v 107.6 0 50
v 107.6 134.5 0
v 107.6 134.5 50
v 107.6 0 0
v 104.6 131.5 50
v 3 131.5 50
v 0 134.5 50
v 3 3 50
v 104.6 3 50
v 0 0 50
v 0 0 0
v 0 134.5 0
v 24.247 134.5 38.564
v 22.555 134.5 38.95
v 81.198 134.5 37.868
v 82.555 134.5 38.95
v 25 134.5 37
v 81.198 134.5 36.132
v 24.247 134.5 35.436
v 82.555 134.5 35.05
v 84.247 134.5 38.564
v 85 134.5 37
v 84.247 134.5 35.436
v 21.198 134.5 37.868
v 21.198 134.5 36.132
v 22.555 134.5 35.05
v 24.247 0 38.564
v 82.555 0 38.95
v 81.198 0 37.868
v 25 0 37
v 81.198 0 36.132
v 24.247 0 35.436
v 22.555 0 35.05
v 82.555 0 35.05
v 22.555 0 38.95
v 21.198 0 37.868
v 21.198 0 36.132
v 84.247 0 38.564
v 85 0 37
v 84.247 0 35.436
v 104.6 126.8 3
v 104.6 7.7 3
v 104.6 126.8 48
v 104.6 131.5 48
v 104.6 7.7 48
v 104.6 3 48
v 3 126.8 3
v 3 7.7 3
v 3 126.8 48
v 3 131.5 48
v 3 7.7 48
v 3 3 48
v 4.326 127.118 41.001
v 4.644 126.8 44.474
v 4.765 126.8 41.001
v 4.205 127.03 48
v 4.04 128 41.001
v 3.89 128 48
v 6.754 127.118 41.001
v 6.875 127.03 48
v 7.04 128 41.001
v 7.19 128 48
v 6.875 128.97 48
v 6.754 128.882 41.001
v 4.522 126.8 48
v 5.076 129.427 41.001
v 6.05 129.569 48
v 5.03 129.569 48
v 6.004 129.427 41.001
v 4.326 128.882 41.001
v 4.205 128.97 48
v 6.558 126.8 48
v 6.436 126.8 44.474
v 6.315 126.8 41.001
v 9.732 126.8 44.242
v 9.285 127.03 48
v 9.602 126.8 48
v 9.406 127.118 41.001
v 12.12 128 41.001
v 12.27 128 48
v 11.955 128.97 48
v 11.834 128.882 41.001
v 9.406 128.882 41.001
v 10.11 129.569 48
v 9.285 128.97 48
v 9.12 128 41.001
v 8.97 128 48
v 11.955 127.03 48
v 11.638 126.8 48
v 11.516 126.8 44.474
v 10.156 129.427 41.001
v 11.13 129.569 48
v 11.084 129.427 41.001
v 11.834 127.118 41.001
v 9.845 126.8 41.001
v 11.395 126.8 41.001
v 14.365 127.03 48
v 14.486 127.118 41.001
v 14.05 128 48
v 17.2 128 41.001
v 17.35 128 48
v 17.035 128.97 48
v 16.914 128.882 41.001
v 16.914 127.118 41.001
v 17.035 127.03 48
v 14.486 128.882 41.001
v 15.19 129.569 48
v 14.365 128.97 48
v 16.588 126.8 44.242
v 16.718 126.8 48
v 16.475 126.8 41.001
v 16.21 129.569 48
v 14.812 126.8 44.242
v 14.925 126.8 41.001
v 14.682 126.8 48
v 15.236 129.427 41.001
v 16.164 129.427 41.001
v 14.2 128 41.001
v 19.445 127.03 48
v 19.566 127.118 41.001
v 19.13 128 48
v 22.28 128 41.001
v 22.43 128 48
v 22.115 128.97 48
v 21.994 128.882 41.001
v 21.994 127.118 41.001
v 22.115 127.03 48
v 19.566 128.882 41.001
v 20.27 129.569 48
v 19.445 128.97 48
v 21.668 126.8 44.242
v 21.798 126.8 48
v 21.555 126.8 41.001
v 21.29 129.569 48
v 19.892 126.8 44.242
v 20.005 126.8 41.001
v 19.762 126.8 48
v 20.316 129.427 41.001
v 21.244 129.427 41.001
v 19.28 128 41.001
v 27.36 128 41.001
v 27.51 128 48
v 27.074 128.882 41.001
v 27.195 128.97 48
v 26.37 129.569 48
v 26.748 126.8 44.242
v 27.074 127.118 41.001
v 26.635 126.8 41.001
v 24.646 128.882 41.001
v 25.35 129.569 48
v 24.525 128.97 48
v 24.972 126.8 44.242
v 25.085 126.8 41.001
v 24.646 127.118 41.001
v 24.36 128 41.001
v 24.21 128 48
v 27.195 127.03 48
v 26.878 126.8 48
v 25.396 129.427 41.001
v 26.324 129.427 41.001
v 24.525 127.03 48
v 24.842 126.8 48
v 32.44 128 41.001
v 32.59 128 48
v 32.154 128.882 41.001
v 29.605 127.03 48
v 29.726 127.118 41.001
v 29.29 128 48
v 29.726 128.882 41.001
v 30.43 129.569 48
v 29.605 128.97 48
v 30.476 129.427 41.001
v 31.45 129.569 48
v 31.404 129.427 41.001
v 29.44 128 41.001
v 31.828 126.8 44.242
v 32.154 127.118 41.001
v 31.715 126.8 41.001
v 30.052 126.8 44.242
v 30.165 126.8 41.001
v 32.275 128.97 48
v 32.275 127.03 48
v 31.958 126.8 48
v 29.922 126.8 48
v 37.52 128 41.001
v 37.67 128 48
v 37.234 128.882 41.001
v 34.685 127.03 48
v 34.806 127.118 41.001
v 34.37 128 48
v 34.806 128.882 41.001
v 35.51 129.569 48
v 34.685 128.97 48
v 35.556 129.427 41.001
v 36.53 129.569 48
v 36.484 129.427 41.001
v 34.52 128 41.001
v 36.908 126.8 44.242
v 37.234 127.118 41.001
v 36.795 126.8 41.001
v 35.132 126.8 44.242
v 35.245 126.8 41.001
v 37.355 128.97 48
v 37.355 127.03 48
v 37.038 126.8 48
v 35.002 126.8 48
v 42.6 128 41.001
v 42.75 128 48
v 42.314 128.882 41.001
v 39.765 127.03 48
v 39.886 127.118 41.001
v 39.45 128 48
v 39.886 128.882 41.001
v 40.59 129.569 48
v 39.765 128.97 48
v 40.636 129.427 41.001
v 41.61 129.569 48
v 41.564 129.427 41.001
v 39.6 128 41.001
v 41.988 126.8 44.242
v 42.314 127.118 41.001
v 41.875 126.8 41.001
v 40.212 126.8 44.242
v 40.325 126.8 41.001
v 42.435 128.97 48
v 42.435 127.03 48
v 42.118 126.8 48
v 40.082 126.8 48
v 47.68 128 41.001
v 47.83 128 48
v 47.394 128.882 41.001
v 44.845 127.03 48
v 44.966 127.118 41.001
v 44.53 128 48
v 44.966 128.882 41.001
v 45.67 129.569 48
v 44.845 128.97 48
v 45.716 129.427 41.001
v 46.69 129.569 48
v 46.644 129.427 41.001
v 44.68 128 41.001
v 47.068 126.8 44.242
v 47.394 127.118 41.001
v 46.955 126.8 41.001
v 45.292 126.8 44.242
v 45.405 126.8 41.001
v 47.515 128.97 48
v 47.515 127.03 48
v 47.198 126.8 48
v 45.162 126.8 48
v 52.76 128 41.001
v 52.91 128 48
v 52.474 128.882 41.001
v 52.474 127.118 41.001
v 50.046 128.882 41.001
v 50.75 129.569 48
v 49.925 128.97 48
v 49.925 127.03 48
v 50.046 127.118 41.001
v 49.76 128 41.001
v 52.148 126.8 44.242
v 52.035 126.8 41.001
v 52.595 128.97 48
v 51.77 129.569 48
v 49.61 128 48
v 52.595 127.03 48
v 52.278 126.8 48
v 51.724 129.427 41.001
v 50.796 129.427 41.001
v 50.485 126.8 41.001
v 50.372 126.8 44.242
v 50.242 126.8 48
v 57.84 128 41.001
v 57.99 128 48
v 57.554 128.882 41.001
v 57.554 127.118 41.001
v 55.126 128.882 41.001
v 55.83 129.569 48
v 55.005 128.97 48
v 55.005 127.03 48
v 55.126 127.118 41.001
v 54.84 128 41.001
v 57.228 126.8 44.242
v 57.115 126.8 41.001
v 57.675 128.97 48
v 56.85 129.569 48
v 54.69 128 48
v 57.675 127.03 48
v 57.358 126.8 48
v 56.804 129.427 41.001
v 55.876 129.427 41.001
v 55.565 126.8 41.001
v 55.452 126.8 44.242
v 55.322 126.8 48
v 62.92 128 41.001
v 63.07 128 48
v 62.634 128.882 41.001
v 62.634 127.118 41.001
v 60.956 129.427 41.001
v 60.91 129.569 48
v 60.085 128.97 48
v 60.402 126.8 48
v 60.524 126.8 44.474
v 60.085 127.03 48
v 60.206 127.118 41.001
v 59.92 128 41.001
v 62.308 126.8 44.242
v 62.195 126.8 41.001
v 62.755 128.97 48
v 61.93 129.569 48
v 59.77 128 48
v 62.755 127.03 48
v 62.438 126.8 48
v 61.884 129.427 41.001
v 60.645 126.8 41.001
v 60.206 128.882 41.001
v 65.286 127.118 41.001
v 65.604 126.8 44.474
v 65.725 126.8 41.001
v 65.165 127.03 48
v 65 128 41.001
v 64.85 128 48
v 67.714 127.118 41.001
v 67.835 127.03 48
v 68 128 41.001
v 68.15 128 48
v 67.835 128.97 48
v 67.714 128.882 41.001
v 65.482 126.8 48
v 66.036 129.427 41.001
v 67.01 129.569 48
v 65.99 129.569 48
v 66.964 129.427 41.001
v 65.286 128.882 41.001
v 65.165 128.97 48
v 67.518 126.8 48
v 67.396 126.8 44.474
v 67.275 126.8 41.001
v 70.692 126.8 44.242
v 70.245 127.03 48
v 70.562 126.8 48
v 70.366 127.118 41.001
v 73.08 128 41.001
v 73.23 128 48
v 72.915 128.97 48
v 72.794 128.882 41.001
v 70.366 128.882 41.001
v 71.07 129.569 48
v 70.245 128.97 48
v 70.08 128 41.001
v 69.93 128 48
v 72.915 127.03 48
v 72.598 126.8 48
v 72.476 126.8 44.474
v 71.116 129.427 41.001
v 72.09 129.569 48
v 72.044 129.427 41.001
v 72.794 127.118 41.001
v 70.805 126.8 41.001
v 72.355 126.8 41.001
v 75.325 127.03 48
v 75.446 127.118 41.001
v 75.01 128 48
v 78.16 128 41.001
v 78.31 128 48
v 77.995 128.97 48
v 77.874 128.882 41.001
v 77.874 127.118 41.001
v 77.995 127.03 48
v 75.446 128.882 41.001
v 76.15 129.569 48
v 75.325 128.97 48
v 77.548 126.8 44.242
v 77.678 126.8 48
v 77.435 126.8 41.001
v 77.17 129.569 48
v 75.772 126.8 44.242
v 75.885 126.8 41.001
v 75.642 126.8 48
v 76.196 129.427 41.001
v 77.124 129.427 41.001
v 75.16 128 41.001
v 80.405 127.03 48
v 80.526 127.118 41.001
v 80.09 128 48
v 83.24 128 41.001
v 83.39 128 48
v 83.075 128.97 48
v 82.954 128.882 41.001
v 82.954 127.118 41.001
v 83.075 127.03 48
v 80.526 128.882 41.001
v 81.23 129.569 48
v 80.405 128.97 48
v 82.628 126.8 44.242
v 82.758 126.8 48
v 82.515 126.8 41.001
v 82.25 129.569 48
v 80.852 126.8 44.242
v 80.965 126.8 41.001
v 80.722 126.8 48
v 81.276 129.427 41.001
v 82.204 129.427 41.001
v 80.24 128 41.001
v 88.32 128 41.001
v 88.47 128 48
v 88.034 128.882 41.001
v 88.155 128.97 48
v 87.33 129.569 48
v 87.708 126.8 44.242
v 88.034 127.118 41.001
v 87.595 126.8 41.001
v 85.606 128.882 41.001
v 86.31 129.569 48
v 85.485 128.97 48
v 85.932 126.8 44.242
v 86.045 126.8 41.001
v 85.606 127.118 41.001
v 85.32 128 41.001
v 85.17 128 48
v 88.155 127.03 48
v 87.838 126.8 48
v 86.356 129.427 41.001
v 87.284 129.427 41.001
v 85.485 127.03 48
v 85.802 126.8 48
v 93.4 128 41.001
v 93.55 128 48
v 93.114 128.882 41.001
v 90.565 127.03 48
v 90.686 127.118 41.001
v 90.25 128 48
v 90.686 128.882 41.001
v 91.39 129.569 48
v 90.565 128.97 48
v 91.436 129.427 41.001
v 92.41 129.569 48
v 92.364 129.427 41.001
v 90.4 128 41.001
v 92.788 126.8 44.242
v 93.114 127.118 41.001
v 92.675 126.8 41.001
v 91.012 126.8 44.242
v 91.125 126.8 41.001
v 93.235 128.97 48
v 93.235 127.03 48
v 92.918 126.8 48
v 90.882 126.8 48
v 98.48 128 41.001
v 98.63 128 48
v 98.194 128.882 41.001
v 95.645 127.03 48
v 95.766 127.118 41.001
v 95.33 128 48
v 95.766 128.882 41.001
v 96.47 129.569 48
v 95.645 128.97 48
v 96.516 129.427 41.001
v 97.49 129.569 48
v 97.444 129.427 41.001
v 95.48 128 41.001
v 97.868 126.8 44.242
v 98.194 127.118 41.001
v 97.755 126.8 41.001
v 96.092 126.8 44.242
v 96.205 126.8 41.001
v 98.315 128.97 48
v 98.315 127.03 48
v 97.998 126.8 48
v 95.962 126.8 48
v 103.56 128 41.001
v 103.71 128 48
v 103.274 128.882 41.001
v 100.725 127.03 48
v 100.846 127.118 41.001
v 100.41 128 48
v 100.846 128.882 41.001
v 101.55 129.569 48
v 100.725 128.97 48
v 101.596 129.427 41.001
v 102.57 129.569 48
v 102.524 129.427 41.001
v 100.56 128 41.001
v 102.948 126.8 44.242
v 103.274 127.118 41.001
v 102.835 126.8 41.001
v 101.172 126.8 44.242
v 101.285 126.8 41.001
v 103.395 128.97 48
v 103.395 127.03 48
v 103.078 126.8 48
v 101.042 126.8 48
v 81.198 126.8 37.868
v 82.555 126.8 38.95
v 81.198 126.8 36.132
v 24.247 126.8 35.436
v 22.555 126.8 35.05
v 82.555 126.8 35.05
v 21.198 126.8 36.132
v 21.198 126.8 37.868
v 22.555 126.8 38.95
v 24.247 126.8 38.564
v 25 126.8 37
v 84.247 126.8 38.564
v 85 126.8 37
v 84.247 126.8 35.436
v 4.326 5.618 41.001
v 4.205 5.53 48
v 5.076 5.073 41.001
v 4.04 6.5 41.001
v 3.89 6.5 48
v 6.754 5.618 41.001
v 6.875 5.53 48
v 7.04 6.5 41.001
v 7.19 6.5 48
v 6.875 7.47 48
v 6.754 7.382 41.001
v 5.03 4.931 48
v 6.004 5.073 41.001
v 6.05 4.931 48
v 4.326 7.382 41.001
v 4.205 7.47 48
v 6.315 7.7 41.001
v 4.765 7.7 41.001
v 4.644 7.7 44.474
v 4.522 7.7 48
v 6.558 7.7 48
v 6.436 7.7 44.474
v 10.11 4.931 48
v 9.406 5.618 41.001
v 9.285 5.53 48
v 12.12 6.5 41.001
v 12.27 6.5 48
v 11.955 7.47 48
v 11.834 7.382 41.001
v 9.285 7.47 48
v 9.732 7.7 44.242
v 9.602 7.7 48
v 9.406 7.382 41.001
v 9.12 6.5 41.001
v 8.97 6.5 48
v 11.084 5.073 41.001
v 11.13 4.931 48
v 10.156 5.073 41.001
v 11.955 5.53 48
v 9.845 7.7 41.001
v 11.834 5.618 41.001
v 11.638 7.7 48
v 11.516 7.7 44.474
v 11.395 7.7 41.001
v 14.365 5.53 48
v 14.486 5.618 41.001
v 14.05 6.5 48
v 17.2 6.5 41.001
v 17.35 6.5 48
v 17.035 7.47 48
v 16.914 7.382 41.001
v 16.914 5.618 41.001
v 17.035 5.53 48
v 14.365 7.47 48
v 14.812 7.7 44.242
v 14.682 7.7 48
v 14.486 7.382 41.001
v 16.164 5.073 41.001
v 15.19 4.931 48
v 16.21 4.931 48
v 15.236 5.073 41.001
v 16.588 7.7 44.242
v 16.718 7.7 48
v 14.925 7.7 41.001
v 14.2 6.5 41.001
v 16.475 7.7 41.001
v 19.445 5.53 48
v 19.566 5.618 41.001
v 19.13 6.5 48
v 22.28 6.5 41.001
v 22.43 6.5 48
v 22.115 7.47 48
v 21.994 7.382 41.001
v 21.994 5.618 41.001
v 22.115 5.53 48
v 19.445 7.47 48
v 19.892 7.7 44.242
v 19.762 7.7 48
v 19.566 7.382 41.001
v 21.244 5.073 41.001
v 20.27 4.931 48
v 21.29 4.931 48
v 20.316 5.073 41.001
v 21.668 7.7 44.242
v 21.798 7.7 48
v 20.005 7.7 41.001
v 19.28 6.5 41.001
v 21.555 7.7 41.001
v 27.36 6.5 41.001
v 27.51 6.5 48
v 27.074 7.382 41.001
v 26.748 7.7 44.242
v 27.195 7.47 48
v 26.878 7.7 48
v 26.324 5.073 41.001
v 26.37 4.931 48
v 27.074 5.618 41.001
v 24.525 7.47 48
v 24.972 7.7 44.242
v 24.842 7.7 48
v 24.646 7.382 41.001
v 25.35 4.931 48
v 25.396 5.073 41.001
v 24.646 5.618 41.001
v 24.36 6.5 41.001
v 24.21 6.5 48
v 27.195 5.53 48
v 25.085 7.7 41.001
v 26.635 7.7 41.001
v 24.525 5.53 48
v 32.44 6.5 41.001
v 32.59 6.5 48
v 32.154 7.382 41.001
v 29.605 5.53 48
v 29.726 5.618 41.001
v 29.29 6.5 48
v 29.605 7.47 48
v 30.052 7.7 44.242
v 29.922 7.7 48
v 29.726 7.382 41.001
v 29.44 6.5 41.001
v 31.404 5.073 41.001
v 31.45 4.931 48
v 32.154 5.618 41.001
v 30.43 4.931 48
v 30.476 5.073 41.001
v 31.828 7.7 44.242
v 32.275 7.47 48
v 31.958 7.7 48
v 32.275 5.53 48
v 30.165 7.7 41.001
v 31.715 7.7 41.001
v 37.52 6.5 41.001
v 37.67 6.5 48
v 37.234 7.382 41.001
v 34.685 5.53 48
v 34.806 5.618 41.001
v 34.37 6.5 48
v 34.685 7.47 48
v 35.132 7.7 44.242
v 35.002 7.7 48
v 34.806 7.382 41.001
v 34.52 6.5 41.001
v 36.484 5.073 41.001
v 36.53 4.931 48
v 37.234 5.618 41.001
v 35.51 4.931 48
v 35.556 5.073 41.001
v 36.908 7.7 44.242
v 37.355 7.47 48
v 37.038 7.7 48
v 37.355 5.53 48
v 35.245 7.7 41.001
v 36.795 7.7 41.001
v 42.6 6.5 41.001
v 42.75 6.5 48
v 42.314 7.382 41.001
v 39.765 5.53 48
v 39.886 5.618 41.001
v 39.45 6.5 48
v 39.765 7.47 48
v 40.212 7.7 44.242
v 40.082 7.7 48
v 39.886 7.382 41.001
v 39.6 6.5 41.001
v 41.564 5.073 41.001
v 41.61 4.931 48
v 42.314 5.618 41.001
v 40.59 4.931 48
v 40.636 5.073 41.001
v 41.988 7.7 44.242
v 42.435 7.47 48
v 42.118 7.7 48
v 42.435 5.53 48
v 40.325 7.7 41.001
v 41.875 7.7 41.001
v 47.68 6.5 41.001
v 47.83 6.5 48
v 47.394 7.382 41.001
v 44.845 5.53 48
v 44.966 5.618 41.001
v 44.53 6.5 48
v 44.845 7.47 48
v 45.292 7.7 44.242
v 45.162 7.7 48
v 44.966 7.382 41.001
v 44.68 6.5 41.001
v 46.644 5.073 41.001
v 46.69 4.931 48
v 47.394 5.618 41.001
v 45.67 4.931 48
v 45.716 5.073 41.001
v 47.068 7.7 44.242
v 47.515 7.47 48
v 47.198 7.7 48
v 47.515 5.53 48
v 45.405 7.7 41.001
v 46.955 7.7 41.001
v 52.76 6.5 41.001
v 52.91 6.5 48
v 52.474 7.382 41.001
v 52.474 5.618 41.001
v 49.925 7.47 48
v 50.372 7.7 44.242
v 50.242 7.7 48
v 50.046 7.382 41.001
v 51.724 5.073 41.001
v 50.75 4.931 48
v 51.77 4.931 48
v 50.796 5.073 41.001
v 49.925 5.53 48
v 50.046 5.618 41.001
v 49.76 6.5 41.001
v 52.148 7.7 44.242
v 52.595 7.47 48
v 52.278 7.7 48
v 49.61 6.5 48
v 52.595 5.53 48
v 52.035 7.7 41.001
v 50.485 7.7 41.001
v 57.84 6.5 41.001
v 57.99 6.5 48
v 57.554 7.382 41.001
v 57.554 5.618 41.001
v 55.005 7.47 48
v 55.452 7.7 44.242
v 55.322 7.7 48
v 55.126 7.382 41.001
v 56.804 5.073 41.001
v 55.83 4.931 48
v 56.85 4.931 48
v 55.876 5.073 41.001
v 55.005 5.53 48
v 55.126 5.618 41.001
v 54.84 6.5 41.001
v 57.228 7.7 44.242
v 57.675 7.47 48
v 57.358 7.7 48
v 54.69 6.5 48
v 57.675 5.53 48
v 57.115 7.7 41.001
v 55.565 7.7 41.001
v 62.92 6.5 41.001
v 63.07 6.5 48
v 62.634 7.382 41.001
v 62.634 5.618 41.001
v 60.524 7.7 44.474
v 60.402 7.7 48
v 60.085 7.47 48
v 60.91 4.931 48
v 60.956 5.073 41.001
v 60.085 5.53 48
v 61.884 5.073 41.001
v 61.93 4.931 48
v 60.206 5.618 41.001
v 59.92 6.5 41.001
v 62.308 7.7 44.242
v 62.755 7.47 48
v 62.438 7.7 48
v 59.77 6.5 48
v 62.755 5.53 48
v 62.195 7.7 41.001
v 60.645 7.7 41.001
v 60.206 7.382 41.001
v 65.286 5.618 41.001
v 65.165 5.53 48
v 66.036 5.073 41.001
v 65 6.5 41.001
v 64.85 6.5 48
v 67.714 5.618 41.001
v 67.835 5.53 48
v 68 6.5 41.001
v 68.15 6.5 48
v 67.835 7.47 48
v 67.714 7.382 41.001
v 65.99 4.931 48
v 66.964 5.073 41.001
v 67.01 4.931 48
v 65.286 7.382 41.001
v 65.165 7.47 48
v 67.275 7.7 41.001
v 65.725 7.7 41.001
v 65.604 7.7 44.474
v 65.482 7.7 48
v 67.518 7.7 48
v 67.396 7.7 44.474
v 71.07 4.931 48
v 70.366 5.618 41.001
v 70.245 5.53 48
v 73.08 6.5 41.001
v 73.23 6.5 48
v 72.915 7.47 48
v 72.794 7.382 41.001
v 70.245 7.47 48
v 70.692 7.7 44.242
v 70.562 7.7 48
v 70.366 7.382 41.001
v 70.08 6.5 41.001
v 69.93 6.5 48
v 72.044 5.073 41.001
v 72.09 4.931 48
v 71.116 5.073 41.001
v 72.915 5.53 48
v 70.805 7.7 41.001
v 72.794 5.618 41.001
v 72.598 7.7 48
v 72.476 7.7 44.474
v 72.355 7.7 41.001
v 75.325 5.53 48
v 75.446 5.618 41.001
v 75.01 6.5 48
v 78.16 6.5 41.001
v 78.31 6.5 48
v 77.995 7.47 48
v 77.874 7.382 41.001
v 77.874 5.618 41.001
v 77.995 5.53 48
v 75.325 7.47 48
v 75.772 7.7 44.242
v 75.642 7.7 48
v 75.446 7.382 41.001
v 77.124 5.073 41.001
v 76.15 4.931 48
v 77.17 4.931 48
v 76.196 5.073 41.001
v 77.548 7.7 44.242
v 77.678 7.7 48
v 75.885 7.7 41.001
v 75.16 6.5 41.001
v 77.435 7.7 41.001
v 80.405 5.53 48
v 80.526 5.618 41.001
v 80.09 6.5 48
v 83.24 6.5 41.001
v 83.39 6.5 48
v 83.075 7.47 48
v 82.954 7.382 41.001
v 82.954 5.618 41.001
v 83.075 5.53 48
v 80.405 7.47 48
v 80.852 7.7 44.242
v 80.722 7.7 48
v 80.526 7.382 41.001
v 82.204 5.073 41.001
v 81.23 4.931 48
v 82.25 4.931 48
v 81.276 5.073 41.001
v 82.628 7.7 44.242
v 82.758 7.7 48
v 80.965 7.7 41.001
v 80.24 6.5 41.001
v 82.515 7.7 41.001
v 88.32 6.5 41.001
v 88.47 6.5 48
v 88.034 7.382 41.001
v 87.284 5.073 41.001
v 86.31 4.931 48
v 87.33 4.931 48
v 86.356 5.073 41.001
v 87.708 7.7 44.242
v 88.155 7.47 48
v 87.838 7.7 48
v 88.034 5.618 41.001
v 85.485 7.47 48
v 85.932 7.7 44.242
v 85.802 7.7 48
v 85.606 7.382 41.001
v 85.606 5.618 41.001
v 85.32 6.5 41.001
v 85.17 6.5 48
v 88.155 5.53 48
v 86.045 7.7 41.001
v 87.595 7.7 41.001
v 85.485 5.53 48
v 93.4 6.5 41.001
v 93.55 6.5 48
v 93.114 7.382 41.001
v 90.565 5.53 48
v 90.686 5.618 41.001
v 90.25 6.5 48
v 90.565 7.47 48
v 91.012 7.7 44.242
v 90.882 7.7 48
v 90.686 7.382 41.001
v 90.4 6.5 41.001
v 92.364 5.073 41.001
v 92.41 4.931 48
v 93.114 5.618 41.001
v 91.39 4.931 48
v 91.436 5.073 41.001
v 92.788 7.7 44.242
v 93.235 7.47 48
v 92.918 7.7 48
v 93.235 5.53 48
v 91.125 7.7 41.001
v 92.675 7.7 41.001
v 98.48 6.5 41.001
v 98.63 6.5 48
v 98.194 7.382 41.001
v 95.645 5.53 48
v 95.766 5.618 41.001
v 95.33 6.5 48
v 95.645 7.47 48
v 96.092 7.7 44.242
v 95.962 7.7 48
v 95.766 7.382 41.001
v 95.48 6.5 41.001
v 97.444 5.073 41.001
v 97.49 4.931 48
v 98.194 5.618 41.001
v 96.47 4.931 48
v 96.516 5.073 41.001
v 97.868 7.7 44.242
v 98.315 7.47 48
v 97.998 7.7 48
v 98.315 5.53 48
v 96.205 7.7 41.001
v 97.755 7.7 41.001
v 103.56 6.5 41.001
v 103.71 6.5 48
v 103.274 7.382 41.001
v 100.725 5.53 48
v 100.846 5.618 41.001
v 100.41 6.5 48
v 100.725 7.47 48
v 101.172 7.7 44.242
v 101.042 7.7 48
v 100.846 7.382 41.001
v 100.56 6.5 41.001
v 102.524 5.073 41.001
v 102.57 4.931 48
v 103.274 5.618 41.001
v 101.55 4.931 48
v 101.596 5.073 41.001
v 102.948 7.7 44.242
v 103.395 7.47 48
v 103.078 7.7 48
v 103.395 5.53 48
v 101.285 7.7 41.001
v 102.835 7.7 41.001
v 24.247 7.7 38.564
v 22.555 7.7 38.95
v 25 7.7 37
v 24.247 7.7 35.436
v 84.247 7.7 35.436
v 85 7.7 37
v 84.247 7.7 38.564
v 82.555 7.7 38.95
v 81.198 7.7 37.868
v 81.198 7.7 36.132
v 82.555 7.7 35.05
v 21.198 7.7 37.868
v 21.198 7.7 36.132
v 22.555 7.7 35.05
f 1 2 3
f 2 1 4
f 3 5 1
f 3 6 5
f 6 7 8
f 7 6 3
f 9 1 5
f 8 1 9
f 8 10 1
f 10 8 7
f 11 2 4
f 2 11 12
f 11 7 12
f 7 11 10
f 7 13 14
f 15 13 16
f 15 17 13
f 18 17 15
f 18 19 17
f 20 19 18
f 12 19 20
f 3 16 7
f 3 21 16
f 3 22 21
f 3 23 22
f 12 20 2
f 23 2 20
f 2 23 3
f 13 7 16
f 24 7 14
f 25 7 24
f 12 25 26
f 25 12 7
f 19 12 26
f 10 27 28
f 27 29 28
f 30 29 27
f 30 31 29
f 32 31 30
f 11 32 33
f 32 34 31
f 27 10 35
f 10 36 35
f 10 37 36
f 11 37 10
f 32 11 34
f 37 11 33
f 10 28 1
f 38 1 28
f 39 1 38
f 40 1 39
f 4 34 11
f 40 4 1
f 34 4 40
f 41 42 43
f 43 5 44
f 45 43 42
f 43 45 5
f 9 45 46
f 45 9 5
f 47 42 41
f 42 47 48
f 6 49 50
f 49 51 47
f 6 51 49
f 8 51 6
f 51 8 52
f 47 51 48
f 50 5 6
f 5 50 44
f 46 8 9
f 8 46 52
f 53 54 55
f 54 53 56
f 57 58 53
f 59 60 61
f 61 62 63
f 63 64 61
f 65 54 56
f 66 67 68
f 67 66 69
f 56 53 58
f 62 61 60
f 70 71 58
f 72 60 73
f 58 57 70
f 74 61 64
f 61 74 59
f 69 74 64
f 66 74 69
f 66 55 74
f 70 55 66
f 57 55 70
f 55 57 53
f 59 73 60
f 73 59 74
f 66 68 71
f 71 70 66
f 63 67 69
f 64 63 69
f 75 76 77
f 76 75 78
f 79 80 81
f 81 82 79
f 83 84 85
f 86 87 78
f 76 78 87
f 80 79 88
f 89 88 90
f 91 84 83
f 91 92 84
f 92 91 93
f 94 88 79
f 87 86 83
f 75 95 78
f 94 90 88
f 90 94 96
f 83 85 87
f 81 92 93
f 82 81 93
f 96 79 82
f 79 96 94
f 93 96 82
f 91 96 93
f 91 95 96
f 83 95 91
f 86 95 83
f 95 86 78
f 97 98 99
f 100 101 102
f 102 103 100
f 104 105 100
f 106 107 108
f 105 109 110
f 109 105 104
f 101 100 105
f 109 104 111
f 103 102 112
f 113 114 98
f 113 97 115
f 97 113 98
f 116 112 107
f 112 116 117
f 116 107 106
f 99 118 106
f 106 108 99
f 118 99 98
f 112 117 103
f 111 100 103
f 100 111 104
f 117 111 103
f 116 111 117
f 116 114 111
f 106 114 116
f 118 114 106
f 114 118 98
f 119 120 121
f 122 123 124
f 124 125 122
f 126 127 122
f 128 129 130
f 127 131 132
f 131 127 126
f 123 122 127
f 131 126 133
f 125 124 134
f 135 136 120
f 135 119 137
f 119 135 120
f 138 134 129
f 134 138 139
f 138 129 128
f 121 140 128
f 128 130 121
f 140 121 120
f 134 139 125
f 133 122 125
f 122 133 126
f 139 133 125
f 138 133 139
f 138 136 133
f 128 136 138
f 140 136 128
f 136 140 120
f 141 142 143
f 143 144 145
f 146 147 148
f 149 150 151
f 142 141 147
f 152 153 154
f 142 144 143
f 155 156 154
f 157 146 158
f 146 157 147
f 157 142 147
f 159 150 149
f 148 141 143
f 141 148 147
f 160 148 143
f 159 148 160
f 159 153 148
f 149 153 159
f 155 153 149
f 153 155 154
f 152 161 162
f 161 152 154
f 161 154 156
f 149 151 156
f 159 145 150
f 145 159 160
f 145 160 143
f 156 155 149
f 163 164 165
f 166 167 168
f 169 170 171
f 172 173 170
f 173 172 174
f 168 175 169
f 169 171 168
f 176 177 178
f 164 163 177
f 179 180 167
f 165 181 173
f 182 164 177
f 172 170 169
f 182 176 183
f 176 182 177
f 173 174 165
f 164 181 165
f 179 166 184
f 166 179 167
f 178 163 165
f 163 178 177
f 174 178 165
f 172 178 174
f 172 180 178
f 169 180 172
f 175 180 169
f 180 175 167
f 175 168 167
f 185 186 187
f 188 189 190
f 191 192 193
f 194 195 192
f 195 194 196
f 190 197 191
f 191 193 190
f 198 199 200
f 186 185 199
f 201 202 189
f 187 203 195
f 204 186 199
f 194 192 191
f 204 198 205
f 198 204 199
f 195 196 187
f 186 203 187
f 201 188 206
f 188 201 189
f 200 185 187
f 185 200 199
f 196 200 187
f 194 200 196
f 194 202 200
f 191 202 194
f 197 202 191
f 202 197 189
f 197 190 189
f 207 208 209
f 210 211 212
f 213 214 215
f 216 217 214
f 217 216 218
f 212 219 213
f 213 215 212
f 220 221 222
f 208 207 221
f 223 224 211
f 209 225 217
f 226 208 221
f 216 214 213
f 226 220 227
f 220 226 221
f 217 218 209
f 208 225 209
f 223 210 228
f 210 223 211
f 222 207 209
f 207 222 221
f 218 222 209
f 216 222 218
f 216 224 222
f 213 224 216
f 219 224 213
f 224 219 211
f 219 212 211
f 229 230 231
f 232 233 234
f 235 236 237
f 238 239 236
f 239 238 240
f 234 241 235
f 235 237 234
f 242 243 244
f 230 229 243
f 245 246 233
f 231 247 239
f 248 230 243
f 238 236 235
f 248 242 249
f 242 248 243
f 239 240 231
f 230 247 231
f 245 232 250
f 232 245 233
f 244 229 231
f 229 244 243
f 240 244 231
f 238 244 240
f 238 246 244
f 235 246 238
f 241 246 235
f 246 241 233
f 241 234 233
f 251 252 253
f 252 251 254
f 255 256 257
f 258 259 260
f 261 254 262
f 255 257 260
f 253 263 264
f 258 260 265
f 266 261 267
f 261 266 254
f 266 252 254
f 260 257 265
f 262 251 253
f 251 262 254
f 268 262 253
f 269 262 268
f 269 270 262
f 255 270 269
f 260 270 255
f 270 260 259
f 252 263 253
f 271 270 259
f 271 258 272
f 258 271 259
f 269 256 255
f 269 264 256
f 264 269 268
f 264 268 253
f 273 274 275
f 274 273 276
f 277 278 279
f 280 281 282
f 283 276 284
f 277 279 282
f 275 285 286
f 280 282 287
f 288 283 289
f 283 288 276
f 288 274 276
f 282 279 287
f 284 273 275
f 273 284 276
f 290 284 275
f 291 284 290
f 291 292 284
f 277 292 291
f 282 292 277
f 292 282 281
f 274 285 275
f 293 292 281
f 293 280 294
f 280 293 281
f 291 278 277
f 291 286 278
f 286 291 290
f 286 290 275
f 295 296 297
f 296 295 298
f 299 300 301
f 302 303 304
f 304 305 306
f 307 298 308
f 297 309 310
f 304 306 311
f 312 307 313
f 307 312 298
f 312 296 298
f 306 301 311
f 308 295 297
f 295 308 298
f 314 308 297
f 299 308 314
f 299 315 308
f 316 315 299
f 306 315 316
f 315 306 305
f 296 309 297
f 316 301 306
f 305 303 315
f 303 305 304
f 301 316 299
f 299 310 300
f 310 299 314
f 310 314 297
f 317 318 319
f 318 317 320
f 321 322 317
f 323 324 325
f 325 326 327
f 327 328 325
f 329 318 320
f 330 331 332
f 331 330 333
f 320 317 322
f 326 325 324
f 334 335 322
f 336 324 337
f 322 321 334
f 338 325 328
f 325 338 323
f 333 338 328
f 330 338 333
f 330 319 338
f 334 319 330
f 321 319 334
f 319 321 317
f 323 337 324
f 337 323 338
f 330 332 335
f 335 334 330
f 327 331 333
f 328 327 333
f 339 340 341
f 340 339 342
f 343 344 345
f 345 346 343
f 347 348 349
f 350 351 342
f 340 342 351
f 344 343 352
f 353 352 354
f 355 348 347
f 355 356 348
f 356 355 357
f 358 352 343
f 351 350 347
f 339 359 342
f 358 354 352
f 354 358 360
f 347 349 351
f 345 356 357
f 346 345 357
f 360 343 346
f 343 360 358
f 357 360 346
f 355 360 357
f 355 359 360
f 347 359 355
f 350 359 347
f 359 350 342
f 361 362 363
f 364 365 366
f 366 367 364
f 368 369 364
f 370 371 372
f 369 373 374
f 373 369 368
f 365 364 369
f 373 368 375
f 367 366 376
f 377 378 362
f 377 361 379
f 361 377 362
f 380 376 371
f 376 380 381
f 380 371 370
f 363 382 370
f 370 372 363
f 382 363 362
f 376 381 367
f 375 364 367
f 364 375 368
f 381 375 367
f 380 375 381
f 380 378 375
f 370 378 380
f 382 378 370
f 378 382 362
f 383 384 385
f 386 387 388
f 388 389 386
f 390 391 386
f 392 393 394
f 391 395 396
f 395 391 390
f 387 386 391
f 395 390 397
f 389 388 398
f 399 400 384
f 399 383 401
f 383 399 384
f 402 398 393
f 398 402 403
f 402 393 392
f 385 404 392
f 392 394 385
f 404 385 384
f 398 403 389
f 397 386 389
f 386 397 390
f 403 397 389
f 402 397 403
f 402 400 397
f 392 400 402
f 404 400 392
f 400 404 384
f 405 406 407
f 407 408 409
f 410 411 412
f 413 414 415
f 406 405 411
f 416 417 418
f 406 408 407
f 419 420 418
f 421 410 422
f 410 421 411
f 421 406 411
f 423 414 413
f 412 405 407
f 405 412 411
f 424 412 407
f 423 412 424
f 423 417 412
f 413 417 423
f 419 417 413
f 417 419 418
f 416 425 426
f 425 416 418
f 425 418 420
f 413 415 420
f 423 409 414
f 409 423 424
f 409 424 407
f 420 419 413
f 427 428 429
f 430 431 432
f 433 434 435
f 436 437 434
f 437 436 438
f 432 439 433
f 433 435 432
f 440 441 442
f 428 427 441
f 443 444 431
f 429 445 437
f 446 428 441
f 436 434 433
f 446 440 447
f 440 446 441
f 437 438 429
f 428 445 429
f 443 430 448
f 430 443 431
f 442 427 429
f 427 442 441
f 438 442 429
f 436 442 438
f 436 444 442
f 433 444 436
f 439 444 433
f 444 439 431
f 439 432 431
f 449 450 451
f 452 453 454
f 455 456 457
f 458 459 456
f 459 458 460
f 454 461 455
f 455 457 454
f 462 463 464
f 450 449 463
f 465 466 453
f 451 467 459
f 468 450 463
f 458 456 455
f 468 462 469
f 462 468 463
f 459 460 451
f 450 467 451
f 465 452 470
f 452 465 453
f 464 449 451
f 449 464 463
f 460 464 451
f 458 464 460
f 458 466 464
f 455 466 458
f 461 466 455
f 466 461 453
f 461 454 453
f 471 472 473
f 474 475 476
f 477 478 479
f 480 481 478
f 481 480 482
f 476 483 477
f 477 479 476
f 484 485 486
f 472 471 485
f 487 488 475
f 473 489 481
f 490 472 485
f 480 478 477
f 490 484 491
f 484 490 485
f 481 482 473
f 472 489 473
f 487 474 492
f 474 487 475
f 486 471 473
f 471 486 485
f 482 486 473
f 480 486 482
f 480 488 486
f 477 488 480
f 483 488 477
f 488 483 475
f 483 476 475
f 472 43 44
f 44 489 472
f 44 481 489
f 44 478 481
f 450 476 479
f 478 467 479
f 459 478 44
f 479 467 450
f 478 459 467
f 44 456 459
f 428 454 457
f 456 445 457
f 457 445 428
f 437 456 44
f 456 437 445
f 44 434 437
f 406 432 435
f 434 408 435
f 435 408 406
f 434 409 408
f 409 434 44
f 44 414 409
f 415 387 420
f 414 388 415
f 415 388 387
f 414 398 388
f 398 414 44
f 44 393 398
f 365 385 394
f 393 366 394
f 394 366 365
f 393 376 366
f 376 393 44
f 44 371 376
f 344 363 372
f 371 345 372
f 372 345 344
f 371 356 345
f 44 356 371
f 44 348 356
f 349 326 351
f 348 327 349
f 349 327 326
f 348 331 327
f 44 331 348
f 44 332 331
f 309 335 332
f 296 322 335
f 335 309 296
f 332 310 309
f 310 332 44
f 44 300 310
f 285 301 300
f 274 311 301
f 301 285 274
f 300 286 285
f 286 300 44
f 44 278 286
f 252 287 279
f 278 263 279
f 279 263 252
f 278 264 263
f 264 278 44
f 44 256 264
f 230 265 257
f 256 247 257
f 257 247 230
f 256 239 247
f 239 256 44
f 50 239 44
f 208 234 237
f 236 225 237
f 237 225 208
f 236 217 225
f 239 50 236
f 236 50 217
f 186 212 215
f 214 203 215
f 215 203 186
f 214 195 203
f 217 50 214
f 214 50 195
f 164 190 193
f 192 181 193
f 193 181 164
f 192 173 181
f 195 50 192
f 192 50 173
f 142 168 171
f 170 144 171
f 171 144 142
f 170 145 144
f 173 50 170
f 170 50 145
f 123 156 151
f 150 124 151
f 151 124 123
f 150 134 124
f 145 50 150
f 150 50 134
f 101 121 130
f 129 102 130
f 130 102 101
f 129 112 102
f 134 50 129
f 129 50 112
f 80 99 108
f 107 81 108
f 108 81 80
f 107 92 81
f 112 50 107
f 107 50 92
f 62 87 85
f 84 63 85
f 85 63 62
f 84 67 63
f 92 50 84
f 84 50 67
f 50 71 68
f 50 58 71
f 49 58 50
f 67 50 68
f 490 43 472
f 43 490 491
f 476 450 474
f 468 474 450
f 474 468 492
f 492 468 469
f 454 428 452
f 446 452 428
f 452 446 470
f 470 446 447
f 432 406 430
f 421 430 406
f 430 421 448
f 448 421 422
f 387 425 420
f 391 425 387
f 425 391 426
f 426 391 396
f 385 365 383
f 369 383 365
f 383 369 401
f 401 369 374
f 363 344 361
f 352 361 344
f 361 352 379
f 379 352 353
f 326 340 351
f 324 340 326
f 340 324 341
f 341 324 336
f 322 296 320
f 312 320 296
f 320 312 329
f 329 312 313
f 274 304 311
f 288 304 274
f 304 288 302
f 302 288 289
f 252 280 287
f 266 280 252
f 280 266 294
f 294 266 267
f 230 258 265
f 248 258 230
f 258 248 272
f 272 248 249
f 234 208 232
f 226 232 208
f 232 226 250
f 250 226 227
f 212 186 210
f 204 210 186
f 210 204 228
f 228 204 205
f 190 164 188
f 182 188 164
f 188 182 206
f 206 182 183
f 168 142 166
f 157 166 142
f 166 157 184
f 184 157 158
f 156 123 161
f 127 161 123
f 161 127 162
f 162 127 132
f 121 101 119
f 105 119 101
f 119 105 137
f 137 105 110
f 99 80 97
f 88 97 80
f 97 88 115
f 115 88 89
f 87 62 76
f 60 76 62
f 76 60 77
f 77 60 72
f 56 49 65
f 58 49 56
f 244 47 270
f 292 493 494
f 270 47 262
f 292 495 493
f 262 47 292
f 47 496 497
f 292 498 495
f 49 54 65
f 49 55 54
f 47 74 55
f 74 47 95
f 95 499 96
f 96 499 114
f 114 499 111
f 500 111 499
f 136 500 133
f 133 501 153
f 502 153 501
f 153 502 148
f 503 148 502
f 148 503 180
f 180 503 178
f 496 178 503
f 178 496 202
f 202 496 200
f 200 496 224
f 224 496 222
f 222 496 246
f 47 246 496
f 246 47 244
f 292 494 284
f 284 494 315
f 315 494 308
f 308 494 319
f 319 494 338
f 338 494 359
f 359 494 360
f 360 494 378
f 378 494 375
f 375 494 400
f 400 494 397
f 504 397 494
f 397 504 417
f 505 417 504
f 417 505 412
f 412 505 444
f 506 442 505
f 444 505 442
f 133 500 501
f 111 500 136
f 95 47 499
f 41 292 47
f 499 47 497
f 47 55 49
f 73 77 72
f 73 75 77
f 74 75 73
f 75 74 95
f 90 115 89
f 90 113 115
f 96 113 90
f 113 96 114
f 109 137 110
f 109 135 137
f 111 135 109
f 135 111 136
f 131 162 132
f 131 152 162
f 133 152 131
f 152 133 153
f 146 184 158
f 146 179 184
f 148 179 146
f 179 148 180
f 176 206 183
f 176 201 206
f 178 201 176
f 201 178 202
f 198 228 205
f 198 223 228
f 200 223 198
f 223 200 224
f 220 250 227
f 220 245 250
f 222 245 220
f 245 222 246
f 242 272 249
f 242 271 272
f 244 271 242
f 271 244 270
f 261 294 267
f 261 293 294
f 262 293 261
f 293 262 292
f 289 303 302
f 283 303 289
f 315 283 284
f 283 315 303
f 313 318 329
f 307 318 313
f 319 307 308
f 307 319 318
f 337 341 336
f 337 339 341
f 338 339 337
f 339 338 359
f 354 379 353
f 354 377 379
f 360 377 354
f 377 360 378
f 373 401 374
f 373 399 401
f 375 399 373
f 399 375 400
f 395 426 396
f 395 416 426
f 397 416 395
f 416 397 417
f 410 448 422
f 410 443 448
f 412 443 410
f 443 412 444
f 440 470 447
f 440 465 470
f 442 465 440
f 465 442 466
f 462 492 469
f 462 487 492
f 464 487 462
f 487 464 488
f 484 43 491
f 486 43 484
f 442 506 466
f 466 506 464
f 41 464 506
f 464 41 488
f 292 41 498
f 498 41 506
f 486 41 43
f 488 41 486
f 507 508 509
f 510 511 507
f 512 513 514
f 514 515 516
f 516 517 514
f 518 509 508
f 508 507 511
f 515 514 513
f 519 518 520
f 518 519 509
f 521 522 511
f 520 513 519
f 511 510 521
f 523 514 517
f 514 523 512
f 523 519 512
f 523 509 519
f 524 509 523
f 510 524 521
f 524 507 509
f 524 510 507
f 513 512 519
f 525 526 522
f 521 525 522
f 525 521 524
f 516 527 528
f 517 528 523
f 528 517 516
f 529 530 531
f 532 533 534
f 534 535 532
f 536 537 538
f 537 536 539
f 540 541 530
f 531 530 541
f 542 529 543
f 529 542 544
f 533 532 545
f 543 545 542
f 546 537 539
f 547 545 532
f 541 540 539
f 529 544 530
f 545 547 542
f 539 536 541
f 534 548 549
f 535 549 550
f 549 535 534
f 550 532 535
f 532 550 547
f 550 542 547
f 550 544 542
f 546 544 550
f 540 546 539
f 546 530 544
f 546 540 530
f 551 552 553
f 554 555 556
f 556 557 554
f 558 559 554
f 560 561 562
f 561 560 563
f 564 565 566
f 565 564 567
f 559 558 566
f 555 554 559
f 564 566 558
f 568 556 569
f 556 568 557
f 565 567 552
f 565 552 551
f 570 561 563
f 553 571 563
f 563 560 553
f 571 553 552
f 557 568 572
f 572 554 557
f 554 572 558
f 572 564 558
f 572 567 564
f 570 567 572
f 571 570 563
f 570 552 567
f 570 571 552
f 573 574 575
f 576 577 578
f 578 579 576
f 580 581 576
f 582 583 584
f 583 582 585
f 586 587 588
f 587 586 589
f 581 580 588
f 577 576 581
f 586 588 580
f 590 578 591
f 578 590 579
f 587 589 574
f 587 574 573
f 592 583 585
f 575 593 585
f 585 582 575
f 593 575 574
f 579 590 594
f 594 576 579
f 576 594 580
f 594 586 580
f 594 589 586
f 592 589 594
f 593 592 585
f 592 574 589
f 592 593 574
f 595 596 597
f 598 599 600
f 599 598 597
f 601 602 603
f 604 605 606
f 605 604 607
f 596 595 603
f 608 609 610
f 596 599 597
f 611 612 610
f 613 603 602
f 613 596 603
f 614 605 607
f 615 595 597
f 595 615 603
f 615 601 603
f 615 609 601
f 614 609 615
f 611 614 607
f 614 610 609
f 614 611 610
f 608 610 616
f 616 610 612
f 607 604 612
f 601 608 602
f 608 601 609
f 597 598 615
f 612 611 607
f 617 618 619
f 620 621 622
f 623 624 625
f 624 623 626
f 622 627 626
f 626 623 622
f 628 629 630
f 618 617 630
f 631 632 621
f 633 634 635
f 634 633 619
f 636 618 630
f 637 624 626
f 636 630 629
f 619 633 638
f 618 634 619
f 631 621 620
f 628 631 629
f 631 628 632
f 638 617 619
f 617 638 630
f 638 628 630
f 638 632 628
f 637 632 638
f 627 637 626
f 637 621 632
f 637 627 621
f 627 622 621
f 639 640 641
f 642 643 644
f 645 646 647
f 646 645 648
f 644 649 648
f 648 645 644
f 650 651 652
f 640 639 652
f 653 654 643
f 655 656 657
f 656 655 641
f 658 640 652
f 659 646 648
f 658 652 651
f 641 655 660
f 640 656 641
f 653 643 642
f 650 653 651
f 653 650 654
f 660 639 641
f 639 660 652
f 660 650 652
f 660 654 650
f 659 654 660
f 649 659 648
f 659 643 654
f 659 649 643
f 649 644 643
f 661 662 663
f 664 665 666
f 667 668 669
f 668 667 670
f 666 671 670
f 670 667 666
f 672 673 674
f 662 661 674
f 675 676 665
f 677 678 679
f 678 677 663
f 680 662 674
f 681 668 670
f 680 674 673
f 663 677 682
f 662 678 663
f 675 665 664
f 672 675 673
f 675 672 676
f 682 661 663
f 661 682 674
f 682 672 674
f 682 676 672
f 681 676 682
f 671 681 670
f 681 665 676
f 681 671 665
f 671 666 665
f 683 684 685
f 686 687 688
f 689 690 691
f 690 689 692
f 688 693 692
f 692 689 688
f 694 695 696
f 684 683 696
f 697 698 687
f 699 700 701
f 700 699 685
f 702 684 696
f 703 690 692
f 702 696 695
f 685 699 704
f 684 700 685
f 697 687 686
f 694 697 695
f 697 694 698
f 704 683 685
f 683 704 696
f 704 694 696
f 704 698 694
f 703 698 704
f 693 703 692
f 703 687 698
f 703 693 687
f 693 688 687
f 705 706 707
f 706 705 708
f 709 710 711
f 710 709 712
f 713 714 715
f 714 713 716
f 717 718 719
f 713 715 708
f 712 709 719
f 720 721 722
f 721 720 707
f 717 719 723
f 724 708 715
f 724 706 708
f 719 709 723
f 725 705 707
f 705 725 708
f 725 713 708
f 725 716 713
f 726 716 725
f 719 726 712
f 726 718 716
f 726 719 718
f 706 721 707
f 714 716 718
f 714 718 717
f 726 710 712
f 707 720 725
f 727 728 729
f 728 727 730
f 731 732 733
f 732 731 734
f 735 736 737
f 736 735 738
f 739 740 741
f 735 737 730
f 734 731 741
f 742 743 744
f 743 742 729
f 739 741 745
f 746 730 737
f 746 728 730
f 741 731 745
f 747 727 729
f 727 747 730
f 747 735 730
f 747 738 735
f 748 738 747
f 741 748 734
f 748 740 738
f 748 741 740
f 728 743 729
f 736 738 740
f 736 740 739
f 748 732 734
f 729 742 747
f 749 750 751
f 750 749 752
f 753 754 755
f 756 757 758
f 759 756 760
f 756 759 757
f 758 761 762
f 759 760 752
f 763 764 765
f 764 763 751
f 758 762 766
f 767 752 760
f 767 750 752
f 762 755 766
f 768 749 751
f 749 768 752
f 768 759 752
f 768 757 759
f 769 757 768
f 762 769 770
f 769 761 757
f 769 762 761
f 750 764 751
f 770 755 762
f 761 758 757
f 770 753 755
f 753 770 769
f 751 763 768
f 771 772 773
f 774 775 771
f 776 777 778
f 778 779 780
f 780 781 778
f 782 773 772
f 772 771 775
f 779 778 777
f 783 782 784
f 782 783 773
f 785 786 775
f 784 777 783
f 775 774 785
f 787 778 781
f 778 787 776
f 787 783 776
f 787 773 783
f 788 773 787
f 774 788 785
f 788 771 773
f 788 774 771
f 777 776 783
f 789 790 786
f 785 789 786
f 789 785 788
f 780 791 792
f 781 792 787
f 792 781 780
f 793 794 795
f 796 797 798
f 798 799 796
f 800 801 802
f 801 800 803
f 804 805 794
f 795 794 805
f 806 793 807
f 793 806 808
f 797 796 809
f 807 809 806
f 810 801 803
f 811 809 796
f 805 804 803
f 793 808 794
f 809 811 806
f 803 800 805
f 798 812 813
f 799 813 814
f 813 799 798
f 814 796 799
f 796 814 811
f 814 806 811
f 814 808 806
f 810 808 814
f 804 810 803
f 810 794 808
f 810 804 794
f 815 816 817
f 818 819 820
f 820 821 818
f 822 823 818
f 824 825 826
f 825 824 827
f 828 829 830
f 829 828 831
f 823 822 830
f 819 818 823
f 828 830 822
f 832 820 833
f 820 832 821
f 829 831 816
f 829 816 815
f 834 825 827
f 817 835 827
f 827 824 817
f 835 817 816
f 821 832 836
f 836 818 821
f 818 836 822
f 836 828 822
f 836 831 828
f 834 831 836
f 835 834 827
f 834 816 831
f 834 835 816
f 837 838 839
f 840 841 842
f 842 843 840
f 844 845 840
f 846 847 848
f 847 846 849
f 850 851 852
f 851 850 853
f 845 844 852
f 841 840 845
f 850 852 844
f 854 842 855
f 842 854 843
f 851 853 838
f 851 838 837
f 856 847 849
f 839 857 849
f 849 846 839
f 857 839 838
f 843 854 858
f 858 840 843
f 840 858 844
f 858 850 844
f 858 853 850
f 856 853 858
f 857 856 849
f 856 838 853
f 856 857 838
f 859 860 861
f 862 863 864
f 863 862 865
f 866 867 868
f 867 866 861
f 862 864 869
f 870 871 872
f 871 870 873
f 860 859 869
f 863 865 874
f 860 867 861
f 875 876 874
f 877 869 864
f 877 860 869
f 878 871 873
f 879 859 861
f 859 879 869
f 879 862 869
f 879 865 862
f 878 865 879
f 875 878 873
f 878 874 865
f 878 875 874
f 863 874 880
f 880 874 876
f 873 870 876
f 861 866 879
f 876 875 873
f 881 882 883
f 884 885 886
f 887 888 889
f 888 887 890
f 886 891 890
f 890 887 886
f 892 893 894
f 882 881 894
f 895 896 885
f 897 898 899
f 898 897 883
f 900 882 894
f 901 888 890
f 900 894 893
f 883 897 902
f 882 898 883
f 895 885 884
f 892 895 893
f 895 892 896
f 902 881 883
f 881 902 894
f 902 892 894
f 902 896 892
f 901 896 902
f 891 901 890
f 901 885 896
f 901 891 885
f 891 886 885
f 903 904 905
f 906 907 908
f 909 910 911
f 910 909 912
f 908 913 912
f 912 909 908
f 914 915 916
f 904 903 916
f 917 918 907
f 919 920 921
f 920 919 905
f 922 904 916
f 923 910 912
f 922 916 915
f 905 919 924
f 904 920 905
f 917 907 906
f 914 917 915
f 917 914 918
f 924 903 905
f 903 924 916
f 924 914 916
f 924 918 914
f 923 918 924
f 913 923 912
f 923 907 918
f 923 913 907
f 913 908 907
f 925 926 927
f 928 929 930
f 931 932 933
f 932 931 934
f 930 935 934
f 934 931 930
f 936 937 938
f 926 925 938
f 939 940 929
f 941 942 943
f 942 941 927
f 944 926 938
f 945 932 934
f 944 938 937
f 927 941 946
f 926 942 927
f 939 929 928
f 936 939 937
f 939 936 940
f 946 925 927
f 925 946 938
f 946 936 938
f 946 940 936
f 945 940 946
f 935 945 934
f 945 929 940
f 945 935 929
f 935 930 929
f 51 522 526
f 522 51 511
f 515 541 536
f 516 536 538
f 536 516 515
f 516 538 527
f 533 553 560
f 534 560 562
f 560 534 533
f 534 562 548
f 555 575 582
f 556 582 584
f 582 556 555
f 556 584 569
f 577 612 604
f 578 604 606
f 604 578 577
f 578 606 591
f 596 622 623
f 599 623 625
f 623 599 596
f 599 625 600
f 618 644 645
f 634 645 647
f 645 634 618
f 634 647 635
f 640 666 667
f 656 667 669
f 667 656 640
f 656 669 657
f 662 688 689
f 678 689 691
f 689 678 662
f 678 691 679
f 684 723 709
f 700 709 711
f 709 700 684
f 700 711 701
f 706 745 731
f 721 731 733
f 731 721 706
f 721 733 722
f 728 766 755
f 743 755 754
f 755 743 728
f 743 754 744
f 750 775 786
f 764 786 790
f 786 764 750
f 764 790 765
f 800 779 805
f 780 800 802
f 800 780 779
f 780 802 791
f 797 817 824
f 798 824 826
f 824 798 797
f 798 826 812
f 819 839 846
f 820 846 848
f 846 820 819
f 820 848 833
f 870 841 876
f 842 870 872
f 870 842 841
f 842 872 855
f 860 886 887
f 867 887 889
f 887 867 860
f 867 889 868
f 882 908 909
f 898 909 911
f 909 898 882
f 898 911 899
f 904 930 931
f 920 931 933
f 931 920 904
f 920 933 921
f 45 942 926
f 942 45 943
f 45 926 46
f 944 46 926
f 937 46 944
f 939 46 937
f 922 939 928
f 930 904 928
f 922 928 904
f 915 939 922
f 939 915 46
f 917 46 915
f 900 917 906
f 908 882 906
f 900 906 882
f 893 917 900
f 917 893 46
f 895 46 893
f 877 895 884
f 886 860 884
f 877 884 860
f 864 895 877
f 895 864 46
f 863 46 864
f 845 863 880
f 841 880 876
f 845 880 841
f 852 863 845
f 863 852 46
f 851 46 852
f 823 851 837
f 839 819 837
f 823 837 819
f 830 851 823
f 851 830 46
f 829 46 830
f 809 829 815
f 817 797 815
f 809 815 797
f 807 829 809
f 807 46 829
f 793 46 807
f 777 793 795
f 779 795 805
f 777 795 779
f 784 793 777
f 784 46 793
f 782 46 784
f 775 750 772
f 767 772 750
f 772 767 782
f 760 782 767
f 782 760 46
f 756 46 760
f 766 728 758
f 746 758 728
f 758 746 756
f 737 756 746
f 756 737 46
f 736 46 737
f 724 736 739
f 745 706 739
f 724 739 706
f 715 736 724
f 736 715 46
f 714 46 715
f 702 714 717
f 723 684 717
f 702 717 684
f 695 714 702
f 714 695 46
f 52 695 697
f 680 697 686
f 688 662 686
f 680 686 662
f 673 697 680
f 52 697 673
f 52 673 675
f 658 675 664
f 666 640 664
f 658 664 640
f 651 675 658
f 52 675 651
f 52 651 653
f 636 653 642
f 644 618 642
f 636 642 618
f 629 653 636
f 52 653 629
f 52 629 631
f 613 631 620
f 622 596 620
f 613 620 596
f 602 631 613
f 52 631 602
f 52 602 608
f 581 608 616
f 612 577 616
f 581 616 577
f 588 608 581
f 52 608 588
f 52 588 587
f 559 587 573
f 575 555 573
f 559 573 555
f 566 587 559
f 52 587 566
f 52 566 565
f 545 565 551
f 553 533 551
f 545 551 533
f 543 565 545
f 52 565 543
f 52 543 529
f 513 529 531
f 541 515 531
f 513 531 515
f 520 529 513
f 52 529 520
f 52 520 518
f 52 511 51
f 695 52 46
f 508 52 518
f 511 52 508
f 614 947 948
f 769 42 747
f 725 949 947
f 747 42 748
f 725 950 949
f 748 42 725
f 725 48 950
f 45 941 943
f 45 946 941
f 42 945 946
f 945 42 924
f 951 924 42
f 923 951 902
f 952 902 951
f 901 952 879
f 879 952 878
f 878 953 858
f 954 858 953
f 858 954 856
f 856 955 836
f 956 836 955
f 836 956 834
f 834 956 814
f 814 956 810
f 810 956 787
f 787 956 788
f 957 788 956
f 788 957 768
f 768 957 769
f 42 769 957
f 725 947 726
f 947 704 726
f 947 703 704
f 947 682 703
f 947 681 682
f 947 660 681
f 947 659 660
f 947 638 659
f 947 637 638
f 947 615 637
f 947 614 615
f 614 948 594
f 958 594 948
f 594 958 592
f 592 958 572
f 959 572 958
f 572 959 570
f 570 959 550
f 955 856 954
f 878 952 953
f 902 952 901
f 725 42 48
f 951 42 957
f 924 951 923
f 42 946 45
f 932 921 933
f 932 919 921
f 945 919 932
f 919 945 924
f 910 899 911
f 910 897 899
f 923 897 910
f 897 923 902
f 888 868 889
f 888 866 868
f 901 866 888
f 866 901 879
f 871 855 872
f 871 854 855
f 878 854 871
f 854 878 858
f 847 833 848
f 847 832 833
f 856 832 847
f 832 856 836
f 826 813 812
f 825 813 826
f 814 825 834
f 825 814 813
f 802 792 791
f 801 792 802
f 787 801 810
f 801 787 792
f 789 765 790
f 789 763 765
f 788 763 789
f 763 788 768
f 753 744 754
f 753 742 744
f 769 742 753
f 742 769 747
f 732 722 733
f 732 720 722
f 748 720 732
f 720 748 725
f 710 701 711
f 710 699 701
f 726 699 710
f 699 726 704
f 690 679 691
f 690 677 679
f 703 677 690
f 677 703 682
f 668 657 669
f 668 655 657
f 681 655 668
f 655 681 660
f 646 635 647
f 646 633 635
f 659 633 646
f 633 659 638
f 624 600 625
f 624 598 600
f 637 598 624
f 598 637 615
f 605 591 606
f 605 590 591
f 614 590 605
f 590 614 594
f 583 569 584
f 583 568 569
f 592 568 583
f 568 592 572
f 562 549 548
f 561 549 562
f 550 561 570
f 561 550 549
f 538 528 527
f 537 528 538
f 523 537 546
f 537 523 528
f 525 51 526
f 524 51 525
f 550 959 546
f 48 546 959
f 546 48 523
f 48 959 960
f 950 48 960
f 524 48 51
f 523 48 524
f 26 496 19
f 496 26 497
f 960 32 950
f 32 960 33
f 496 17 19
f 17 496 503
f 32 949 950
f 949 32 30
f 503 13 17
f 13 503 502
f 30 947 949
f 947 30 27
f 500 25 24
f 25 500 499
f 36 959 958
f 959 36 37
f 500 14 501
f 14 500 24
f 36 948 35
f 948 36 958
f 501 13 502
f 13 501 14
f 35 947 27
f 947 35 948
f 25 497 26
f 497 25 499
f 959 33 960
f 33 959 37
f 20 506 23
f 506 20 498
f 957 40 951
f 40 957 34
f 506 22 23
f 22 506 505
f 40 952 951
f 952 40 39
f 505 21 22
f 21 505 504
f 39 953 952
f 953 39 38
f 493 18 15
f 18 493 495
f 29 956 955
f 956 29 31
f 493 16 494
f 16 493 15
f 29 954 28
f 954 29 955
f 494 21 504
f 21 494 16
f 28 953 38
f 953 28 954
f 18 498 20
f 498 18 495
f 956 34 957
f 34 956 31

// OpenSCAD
U = 5.08;
H = 128.5;
W = 20*U;
R = 1.65;
Depth = 50;
P = 2.3;


module box1() {

  difference() {
    union() {
      difference() {
          cube([W + 6, H + 6, Depth]);
          
          translate([3, 3, 3])
          cube([W, H, Depth]);
      }

      translate([3, 3 + H - 7, 0])
      difference() {
          translate([0, P, 0])
          cube([W, 7 - P, Depth - 2]);
          
          for (i = [U/2:U:W]) {
              translate([i, 3.5, Depth - 2 - 6.999])
              cylinder(7, R-.15, R, $fn = 10);
          }
      }

      translate([3, 3, 0])
      difference() {
          cube([W, 7- P, Depth - 2]);
          
          for (i = [U/2:U:W]) {
              translate([i, 3.5, Depth - 2 - 6.999])
              cylinder(7, R-.15, R, $fn = 10);
          }
      }
    }

    for ( i = [23 : 60 : W] ) {
      translate([i, -1, Depth - 13])
      rotate([270, 0, 0])
      cylinder(1000, 2, 2);
    }

  
  }


}


box1();
